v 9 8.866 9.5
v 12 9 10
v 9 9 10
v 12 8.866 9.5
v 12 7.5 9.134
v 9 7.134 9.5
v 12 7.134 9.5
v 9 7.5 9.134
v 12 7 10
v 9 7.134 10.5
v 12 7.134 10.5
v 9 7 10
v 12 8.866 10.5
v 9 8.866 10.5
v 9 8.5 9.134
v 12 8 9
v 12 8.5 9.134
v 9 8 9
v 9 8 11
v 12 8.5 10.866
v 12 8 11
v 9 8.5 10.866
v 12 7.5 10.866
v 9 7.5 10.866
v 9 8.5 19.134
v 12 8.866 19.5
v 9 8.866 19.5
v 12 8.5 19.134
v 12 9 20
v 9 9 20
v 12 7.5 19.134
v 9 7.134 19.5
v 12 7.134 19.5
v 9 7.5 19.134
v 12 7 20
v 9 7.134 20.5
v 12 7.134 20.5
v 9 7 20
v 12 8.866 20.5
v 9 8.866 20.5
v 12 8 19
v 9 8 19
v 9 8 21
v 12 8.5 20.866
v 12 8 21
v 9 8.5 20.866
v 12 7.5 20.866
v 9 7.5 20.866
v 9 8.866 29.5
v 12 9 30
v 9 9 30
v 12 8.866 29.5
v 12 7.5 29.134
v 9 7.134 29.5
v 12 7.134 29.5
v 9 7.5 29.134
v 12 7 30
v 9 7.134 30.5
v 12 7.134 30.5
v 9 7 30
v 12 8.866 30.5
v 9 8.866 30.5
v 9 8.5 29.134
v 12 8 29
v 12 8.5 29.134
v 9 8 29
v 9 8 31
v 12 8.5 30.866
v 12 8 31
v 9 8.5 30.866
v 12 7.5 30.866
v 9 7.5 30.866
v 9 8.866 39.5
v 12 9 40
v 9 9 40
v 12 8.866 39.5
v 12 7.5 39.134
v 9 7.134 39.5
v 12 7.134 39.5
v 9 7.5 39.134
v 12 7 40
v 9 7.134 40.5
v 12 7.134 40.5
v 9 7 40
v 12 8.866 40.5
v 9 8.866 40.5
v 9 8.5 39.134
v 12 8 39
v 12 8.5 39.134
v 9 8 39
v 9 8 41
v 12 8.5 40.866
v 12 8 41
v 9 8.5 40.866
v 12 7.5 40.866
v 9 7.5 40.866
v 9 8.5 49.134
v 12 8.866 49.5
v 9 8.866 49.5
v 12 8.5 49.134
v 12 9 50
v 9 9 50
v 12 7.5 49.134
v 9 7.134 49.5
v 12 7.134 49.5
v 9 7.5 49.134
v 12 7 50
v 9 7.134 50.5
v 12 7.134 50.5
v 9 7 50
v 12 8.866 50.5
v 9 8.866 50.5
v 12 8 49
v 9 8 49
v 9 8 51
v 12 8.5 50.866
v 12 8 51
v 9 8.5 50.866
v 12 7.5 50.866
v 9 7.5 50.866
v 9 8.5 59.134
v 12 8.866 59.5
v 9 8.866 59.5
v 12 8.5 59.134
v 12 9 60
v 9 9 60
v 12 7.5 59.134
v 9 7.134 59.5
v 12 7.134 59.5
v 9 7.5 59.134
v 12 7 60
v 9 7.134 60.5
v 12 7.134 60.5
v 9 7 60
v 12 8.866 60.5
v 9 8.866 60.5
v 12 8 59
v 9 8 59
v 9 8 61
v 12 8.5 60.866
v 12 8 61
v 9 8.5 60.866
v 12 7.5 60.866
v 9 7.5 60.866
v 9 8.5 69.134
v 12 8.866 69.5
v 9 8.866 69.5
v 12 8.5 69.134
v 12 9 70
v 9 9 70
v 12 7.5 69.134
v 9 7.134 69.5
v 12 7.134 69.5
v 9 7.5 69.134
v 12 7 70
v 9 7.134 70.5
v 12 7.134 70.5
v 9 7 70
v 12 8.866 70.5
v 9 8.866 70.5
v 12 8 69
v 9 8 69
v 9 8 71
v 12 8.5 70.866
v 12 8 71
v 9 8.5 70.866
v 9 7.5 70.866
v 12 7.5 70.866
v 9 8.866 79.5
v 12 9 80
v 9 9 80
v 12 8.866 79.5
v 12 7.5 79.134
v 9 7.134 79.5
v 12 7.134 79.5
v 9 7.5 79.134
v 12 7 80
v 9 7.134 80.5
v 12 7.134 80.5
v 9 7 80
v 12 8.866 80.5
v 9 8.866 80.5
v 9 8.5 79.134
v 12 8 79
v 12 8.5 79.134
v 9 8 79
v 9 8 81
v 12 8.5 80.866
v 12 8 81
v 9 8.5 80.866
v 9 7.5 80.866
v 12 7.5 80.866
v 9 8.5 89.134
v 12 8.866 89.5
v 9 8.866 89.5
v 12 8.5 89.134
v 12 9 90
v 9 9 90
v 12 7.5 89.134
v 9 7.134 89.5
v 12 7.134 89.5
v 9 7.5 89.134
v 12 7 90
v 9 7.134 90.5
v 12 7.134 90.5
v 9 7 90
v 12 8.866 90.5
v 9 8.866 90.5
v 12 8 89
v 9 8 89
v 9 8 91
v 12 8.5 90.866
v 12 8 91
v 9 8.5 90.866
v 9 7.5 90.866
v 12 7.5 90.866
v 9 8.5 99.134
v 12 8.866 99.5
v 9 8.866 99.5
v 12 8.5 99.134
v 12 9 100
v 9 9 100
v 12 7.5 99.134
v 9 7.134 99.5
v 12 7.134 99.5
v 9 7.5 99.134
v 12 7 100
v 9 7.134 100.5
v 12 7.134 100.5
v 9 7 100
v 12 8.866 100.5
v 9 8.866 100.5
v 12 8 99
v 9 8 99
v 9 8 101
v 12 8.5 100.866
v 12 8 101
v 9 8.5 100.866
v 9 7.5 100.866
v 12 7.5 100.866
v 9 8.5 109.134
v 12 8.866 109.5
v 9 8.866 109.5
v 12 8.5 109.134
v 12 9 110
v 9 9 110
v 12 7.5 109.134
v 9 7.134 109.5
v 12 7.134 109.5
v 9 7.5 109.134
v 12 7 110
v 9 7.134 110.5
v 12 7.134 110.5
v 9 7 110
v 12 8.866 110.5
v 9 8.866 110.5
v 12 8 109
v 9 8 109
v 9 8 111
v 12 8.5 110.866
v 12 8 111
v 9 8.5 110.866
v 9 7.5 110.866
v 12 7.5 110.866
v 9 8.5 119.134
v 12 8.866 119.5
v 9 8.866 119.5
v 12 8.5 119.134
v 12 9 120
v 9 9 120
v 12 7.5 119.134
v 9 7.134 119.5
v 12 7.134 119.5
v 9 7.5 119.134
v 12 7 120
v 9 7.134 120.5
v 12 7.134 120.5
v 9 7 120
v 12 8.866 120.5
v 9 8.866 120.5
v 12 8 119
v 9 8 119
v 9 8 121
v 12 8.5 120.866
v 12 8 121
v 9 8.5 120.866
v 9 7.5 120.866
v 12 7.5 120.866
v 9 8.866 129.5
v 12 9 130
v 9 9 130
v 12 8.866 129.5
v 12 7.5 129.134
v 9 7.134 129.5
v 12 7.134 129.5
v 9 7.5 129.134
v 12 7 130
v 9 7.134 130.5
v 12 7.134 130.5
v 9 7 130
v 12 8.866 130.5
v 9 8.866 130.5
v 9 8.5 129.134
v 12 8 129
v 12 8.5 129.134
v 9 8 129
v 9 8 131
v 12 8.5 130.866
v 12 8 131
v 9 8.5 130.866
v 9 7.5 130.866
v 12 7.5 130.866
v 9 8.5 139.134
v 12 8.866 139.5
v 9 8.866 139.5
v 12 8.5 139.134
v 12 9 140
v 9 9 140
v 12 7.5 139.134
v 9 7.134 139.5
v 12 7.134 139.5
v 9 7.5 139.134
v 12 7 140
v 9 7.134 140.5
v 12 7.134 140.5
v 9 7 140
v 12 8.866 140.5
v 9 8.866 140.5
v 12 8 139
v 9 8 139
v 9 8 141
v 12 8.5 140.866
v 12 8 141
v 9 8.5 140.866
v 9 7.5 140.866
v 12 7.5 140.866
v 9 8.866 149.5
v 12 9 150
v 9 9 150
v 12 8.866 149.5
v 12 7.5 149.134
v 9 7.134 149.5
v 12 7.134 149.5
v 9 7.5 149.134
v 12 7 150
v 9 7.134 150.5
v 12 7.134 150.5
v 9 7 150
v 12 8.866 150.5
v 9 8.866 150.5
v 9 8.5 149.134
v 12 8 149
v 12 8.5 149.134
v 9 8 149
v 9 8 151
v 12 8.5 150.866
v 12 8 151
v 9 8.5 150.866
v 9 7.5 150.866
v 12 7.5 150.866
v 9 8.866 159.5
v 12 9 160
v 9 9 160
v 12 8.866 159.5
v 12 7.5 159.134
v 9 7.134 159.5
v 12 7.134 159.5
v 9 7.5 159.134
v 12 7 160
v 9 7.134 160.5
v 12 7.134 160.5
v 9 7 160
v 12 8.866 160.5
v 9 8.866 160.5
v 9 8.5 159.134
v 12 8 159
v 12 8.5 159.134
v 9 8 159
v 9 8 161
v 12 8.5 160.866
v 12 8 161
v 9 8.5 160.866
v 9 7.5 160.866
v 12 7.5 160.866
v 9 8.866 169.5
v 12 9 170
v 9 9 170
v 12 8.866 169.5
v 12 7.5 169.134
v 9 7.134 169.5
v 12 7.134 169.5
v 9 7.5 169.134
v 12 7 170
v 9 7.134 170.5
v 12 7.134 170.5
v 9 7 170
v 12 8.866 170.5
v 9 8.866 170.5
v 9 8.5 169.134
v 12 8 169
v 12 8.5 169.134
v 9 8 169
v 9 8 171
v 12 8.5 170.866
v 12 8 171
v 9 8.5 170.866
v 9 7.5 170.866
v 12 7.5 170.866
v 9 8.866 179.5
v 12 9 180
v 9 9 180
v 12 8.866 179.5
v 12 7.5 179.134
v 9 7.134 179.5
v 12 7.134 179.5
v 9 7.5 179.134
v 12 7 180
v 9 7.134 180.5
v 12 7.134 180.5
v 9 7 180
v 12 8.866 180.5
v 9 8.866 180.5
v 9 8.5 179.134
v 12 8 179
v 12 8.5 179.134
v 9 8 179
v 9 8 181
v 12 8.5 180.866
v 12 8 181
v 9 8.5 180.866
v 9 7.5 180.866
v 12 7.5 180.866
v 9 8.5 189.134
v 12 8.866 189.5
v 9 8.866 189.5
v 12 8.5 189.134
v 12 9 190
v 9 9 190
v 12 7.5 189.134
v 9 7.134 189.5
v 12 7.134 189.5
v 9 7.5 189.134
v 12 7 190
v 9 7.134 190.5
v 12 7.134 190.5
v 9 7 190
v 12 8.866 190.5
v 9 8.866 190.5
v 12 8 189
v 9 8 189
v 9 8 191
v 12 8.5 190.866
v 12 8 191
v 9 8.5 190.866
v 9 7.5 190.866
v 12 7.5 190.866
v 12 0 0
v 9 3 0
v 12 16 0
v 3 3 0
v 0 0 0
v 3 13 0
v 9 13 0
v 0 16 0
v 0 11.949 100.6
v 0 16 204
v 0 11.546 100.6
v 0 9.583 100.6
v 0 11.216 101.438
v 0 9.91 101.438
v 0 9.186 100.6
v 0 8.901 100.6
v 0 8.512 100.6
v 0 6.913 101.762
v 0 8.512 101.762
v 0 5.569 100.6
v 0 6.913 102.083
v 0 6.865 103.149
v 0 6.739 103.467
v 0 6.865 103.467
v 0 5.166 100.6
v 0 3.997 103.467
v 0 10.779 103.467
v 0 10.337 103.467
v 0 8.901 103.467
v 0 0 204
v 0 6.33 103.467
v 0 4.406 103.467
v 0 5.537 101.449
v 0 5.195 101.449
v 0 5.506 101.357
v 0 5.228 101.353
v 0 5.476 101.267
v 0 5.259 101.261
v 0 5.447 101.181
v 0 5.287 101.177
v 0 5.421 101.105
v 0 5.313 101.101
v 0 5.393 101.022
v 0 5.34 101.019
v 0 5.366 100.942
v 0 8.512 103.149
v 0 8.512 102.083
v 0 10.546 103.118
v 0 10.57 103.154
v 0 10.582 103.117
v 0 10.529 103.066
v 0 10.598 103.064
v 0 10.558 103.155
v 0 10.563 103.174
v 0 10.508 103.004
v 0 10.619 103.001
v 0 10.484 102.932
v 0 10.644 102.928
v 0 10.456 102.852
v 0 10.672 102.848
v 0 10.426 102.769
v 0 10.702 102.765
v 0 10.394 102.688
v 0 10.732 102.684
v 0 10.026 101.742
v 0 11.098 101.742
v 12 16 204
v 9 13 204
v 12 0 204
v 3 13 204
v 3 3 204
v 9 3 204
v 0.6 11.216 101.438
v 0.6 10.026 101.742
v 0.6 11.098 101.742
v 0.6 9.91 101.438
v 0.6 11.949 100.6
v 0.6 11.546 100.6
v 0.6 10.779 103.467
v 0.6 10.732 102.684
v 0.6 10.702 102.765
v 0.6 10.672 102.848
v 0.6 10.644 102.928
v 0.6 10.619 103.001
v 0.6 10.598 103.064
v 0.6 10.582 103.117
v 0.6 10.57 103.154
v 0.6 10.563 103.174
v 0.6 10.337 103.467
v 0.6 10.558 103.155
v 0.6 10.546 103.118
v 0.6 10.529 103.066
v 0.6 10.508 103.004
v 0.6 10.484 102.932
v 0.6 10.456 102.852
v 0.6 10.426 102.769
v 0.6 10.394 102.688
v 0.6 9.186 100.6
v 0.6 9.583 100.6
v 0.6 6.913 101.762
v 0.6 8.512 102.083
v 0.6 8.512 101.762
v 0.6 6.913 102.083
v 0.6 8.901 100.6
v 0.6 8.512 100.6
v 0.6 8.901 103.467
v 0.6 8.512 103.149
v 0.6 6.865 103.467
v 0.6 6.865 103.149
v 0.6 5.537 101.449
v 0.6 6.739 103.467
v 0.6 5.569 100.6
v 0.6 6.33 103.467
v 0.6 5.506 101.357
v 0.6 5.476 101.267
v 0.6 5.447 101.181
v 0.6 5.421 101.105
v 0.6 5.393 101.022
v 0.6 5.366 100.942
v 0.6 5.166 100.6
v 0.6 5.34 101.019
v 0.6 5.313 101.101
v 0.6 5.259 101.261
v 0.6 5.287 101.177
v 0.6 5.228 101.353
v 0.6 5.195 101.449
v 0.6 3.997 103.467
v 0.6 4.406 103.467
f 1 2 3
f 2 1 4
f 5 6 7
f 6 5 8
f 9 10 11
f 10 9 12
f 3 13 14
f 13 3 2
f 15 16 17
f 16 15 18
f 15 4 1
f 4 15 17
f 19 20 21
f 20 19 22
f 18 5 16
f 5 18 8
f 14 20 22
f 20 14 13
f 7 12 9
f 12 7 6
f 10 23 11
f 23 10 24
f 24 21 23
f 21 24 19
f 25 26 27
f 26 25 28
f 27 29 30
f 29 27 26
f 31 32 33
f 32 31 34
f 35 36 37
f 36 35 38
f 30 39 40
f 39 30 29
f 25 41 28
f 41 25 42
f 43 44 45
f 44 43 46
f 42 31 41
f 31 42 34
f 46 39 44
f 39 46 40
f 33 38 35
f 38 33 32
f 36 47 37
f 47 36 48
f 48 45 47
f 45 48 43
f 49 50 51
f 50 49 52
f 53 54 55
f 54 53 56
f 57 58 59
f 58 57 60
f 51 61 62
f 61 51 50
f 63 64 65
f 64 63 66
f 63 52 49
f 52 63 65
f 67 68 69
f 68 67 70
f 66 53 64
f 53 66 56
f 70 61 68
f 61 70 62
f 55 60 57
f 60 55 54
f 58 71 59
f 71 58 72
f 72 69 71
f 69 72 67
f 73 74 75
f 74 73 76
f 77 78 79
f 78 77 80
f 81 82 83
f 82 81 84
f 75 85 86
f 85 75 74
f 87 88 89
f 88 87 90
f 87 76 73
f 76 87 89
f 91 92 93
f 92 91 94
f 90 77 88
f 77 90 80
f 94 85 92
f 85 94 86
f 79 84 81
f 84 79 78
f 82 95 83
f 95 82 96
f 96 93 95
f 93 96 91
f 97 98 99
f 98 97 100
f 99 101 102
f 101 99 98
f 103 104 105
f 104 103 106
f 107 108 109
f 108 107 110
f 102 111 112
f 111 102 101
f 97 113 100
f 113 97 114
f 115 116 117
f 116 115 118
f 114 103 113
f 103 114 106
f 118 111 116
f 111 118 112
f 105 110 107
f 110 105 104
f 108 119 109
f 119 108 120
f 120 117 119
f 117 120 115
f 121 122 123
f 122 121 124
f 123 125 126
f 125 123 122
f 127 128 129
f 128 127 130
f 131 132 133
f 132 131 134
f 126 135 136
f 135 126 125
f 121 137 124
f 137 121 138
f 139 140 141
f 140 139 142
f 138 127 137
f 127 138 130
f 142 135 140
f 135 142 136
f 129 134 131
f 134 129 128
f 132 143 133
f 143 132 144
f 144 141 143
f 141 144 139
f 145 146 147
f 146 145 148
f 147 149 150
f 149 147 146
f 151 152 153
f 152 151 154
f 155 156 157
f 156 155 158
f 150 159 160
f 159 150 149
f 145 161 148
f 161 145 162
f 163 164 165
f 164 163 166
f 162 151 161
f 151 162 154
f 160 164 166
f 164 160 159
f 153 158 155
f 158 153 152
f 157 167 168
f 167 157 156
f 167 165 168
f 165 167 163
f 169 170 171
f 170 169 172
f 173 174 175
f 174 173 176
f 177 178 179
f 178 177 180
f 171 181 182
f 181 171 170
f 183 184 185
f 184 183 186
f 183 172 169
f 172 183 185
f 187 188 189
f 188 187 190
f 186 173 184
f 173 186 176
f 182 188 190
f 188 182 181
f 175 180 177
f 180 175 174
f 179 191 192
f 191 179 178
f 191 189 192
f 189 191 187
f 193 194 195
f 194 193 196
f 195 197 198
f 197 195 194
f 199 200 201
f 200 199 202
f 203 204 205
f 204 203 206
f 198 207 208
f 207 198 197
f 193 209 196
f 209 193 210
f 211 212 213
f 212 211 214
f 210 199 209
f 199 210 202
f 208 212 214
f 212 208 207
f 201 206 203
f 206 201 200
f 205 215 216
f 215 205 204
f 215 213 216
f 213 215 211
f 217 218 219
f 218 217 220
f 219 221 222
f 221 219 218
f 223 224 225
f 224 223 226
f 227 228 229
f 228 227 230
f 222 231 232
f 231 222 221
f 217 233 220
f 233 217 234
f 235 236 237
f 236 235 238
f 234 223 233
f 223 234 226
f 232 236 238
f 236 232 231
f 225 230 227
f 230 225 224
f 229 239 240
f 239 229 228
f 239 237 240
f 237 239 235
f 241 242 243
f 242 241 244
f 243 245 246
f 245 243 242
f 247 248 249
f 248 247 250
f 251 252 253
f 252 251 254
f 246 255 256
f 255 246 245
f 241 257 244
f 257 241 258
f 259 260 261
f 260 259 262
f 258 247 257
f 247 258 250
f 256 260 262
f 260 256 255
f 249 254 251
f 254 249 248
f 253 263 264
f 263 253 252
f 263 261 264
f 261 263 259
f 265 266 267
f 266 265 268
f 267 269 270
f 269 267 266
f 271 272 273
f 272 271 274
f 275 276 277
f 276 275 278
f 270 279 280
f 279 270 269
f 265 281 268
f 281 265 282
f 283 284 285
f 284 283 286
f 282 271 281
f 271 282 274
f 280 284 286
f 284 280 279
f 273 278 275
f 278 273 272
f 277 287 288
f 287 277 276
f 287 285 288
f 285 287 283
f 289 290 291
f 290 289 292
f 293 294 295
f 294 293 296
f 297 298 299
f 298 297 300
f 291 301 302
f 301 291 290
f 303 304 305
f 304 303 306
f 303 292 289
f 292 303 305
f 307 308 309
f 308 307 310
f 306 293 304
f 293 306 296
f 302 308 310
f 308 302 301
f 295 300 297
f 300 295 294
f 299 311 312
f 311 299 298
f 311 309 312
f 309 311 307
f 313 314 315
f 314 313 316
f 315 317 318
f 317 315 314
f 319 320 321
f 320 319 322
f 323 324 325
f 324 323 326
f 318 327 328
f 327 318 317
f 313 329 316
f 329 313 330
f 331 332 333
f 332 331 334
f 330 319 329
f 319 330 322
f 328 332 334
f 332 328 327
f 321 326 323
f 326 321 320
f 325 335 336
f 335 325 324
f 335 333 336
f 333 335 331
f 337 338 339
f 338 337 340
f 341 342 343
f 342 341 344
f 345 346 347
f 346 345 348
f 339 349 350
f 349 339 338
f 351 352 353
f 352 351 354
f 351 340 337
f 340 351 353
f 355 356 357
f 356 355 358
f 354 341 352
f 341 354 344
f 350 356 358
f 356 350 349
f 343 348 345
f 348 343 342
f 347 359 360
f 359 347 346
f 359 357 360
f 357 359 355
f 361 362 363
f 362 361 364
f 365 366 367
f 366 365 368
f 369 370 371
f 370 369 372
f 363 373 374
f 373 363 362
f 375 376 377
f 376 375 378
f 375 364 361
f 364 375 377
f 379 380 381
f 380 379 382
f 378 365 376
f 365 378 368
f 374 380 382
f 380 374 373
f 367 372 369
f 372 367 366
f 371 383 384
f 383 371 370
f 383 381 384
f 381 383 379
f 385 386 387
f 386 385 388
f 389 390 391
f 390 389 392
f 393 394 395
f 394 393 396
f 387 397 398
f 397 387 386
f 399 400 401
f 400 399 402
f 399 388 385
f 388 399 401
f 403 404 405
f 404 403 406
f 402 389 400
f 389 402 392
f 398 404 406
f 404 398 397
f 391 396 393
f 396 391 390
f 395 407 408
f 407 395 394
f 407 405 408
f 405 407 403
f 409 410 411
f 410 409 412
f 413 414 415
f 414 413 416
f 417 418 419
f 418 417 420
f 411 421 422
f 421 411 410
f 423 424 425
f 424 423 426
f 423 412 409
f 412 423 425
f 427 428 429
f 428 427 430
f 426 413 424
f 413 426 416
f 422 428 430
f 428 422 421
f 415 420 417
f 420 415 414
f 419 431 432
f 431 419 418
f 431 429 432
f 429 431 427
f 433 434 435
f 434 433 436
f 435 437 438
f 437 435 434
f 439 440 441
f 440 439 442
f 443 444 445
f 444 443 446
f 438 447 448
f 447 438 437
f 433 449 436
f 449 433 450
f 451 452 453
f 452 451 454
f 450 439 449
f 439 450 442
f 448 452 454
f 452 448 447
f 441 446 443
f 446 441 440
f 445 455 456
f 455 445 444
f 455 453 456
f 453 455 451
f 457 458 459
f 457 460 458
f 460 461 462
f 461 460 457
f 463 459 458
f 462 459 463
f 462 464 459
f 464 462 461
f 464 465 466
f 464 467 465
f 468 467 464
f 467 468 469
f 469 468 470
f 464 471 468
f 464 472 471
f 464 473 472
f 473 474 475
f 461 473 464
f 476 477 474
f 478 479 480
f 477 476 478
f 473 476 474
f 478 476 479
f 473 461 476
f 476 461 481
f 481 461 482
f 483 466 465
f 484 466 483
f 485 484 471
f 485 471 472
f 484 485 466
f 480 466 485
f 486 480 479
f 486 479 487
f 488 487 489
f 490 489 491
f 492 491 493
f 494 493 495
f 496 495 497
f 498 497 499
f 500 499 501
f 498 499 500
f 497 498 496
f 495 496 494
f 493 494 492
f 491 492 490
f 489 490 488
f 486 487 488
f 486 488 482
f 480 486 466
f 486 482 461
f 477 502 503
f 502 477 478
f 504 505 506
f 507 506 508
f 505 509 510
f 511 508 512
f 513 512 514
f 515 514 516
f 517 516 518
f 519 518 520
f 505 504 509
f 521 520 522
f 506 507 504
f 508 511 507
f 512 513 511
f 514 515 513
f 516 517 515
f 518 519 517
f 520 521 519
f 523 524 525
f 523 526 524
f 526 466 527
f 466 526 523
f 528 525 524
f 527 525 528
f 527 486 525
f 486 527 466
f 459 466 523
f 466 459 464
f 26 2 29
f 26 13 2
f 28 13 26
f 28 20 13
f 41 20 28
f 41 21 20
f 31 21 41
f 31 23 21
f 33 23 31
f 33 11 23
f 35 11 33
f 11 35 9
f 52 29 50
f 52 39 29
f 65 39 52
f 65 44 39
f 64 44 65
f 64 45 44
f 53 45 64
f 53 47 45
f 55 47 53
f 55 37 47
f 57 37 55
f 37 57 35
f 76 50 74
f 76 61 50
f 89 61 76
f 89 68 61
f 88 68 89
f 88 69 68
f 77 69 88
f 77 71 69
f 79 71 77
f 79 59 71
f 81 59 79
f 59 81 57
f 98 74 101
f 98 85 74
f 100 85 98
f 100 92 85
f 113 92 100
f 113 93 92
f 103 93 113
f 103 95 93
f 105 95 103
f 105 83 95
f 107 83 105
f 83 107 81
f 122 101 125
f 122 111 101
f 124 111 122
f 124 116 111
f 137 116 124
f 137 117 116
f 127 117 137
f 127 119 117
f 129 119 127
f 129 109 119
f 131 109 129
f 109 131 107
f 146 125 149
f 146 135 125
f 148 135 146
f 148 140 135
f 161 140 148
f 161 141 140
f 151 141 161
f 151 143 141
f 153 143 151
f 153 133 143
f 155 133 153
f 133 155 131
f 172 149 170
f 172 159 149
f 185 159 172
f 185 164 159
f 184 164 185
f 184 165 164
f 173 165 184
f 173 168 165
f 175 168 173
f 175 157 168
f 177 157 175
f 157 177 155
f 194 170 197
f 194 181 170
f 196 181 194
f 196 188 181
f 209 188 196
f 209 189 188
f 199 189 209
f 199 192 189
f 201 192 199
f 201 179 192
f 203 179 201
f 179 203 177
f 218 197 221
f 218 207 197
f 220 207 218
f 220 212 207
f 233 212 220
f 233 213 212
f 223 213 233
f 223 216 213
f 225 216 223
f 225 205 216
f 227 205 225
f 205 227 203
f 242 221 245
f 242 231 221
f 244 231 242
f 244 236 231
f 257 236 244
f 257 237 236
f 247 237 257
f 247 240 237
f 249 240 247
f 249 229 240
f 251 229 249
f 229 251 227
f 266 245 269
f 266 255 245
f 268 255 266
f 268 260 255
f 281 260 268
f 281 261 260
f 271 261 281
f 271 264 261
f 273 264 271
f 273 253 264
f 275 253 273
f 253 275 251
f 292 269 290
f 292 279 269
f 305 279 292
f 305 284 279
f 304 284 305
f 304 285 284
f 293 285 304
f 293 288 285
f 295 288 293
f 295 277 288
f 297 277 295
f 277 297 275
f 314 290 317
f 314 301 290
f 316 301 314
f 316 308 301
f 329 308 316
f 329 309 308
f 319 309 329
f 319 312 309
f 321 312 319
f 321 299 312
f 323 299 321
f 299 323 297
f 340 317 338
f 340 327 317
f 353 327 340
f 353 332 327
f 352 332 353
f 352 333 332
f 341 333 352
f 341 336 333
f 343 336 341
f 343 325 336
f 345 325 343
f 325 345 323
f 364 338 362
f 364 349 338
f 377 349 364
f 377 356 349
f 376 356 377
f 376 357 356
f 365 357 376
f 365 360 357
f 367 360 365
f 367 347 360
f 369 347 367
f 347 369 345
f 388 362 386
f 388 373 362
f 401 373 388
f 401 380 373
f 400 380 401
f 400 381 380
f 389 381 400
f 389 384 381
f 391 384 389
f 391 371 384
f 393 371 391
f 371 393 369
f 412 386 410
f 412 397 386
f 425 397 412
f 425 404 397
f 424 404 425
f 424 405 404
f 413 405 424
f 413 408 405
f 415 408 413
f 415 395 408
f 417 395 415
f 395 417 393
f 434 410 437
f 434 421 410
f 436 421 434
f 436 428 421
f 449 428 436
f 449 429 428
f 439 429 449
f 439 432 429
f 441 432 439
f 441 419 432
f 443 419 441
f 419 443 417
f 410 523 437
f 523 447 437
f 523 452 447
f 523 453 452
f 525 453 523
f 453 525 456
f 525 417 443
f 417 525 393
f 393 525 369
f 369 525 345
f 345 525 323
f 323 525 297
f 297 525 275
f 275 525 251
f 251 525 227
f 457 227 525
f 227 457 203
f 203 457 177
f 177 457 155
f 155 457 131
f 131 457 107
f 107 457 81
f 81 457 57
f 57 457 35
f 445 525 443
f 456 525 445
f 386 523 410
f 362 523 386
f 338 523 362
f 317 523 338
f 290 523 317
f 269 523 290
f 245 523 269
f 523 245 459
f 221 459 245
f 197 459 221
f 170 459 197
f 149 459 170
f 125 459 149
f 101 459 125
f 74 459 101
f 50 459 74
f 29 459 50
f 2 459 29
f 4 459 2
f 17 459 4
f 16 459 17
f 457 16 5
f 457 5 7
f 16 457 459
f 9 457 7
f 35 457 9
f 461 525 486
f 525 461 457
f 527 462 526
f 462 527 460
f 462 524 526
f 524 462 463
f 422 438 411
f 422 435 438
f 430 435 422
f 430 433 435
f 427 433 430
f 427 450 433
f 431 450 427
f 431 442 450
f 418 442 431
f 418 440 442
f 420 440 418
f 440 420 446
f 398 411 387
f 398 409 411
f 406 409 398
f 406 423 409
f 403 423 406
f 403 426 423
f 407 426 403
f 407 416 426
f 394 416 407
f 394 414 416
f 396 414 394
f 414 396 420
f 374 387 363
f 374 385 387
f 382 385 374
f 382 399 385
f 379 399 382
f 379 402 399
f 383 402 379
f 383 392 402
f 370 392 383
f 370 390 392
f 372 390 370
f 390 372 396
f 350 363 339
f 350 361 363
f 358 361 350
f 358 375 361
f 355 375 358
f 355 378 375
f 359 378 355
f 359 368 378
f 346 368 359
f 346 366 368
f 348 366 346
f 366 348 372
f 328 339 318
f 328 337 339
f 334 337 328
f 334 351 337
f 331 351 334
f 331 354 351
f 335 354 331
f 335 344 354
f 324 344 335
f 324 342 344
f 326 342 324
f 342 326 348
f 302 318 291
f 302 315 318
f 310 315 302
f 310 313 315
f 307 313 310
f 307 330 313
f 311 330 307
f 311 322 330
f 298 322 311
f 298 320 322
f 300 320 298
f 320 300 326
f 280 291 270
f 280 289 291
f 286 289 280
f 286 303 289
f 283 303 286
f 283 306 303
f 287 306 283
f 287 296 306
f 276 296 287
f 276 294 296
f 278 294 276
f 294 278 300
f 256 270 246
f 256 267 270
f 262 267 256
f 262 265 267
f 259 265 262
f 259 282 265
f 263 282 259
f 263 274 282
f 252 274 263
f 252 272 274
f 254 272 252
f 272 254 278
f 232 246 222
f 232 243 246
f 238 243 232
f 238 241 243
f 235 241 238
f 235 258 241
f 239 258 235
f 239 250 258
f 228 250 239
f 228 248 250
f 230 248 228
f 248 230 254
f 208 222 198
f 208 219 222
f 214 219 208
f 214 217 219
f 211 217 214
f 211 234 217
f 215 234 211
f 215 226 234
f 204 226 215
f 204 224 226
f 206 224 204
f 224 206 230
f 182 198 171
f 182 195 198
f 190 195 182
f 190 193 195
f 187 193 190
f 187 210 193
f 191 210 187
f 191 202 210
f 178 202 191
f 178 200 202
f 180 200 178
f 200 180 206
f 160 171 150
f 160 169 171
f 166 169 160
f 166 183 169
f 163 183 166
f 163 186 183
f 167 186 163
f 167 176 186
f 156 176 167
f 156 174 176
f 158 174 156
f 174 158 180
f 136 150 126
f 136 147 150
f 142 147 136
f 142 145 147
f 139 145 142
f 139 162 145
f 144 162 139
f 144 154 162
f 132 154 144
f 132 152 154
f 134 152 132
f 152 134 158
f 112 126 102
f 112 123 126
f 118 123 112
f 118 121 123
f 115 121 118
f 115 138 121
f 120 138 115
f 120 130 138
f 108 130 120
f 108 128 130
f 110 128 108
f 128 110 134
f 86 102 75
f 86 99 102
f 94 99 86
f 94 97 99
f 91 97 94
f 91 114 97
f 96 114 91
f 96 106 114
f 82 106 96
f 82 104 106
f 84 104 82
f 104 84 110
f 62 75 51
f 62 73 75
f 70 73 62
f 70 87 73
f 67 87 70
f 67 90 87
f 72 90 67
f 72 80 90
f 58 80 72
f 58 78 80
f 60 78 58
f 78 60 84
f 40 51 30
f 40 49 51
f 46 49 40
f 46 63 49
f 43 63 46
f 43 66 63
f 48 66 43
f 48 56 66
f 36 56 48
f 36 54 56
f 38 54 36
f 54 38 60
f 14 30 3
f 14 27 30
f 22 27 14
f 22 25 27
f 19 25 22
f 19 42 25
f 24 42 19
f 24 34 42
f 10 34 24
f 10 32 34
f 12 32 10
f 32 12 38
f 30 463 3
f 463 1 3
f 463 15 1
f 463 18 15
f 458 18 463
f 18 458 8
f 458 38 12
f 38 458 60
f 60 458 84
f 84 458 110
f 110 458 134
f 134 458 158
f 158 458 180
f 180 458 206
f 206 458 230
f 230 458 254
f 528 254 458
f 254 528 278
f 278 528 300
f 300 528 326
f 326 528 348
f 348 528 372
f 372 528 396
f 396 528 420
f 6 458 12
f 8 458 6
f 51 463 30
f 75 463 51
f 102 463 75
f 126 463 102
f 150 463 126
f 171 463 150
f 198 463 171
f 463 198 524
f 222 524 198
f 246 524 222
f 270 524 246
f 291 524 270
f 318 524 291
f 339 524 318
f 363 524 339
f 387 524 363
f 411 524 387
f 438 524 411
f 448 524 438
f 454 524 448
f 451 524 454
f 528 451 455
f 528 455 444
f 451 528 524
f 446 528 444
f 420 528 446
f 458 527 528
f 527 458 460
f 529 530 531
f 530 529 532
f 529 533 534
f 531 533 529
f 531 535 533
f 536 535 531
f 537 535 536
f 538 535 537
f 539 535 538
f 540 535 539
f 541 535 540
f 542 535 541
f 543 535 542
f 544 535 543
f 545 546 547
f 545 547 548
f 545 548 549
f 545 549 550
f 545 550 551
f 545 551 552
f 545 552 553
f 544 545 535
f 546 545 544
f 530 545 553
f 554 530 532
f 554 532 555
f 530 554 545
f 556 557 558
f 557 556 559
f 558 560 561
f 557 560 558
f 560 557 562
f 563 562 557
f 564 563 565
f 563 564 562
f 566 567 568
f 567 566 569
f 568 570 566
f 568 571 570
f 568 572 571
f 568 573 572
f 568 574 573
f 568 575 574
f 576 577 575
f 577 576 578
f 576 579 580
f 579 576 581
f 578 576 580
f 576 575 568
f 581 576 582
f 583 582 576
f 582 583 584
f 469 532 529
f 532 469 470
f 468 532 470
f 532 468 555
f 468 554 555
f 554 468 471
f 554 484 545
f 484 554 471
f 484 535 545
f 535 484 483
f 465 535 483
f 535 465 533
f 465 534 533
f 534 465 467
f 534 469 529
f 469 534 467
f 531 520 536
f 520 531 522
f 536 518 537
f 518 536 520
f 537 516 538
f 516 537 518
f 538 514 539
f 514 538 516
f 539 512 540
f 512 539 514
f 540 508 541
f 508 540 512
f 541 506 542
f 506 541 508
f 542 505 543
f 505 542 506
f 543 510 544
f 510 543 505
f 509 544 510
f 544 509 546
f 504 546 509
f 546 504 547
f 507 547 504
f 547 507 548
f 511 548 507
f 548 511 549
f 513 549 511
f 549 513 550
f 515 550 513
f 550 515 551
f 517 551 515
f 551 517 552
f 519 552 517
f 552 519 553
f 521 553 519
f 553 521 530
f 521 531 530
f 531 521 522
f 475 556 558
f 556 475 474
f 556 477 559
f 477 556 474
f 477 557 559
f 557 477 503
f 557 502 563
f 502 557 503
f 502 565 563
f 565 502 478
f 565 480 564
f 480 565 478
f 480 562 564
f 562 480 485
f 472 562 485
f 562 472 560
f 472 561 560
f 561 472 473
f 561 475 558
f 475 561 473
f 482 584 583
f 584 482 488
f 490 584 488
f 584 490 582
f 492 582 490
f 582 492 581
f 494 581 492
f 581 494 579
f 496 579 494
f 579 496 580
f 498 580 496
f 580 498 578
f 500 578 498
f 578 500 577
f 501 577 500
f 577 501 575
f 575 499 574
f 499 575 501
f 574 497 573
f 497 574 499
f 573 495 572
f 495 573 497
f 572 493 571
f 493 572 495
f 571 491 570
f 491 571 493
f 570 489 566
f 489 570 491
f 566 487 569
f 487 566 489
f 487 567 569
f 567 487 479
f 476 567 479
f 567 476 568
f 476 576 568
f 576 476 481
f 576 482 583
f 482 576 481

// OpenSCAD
// file: ../../lib/emboss.scad
// cad/lib/emboss.scad
include <../generated/dims.scad>

module engrave(code, at, z, size = LABEL_SIZE, facing = -1, spin = 0) {
    if (facing < 0)
        translate([at[0] + LABEL_DEPTH, at[1], z]) rotate([90, 0, -90])
            linear_extrude(LABEL_DEPTH + 0.01) rotate(spin) text(code, size = size, halign = "center", valign = "center");
    else
        translate([at[0] - LABEL_DEPTH, at[1], z]) rotate([90, 0, 90])
            linear_extrude(LABEL_DEPTH + 0.01) rotate(-spin) text(code, size = size, halign = "center", valign = "center");
}
// file: ../dims.scad
MAX_SEG = 240.0;
JOINT_GAP = 1.0;
DEPTH = 63.0;
FRAME_W = 58.0;
FRAME_BODY = 40.0;
TRANSOM_W = 70.0;
TRANSOM_HALF_BODY = 17.0;
SASH_W = 51.0;
SASH_BODY = 33.0;
SASH_Y0 = 2.0;
SASH_GAP = 13.0;
STAY_W = 14.0;
SCREEN_W = 30.0;
SCREEN_DEPTH = 20.0;
SCREEN_OVERLAP = 10.0;
SCREEN_SHELL = 4.0;
GLASS_T = 24.0;
TWINWALL_T = 16.0;
GLASS_CLEAR = 3.0;
GASKET_T = 3.0;
GASKET_IN = 4.0;
GLASS_EDGE = 43.0;
TRANSOM_GLASS = 20.0;
SASH_GLASS = 36.0;
STOP_T = 8.0;
GLASS_Y0 = 11.0;
BEAD_W = 16.0;
BEAD_T = 10.0;
KEY_Y = 43.0;
KEY_D = 4.0;
KEY_H = 4.0;
KEY_LIP = 0.8;
KEY_THROAT = 1.2;
FIN_Y0 = 20.0;
FIN_Y1 = 28.0;
FIN_L = 8.0;
ISTOP_Y0 = 54.0;
FLANGE_Y1 = 17.0;
FLANGE_L = 11.0;
LIP_Y0 = 46.0;
LIP_Y1 = 52.0;
LIP_L = 8.0;
KERF_W = 3.0;
KERF_D = 5.0;
MAG_W = 13.0;
MAG_D = 2.0;
SPLINE_W = 4.0;
SPLINE_D = 5.0;
SPACER_W = 12.0;
ACRYLIC_T = 4.0;
SETTING_L = 100.0;
WEEP_CAP_H = 12.0;
WEEP_CAP_T = 1.5;
TUBE_FRAME = [20.0, 20.0];
TUBE_TRANSOM = [20.0, 40.0];
TUBE_SASH = [20.0, 20.0];
TUBE_SCREEN = [10.0, 10.0];
SOCKET_FRAME = 28.0;
SOCKET_SASH = 21.0;
SOCKET_SCREEN = 12.0;
TUBE_END_CLEAR = 1.5;
TUBE_CLEAR = 0.3;
MIN_SHELL = 6.0;
CHAMBER_WALL = 2.5;
MIN_SKIN = 1.5;
END_CAP = 4.0;
CORD_D = 3.0;
CORD_INSET = 1.5;
FIX_Y = 16.0;
FIX_Y_IN = 48.0;
FIX_DZ = 7.0;
FIX_D = 5.0;
FIX_CB_D = 10.0;
FIX_CB_L = 6.0;
FIX_BOSS_D = 15.0;
TUBE_SCREW_D = 4.2;
CSK_D = 8.6;
TRANSOM_SCREW_X = 39.0;
INSERT_M4_D = 5.6;
INSERT_M4_L = 8.0;
BOSS_PITCH = 24.0;
CAM_ALIGN_TOL = 1.0;
DOVE_W = 16.0;
DOVE_FLARE = 3.0;
DOVE_D = 6.0;
DOVE_CLEAR = 0.3;
LOCK_U = 3.0;
LOCK_D = 3.3;
LOCK_L = 22.0;
NODE_FIX_OFFSET = 25.0;
SHOE_WALL = 3.0;
HINGE_BOSS_X = 21.0;
CAM_BOSS_X = 47.0;
TRANSOM_MAG_X = 20.0;
LABEL_DEPTH = 0.6;
LABEL_SIZE = 5.0;
BEAD_LABEL = 3.0;
WEEP_W = 20.0;
WEEP_H = 5.0;
SILL_SLOPE_DEG = 8.0;
NOSE_KEY_X = 10.0;
NOSE_KEY_W = 6.0;
NOSE_KEY_D = 4.0;
NOSE_PROJECTION = 15.0;
MULLION_W = 70.0;
MULLION_HALF_BODY = 17.0;
MULLION_DOVE_D = 4.0;
VSLOT_SHIFT = 3.0;
VSLOT_MOUTH = 9.16;
VSLOT_NECK = 6.25;
VSLOT_LIP = 1.8;
VSLOT_FLOOR = 6.1;
VSLOT_SHOULDER = [5.6, 8.5];
VSLOT_TIP = [5.0, 5.8];
VSLOT_SCREW_D = 5.5;
VSLOT_CSK_D = 10.0;
VSLOT_M5_L = [10, 12, 16, 20, 25, 30, 35, 40];
VSLOT_TRANSOM_X = 41.25;
EDGE_R = 2.0;
JOINT_BEVEL = 0.8;
BEVEL_STEP = 0.2;
HANDLE_R = 3.0;
// file: ../../parts/acrylic_spacer.scad
// cad/parts/acrylic_spacer.scad
include <../generated/dims.scad>
use <../profile.scad>
use <../lib/emboss.scad>

function spacer_t(gap) = is_undef(gap) ? GLASS_T - 2 * ACRYLIC_T : gap;

module spacer_channel(gap) { rect(3, 3, SPACER_W - 3, spacer_t(gap) - 3); }

module acrylic_spacer(len, code, gap) {
    difference() {
        linear_extrude(len) rect(0, 0, SPACER_W, spacer_t(gap));
        translate([0, 0, -0.01]) linear_extrude(len + 0.02) spacer_channel(gap);
        for (z = [10 : 10 : len - 5])
            translate([SPACER_W - 3.5, spacer_t(gap) / 2, z]) rotate([0, 90, 0]) cylinder(d = 2, h = 4, $fn = 12);
        engrave(code, [0, spacer_t(gap) / 2], len / 2, 3);
    }
}

module acrylic_spacer_corner(code, gap) {
    leg = 15;
    plug = [SPACER_W - 6 - 0.3, spacer_t(gap) - 6 - 0.3];
    linear_extrude(spacer_t(gap)) square([SPACER_W, SPACER_W]);
    translate([SPACER_W, 3.15, 3.15]) cube([leg, plug[0], plug[1]]);
    translate([3.15, SPACER_W, 3.15]) cube([plug[0], leg, plug[1]]);
}
// main file
use <../../parts/acrylic_spacer.scad>
acrylic_spacer(204.0, "AFV");
